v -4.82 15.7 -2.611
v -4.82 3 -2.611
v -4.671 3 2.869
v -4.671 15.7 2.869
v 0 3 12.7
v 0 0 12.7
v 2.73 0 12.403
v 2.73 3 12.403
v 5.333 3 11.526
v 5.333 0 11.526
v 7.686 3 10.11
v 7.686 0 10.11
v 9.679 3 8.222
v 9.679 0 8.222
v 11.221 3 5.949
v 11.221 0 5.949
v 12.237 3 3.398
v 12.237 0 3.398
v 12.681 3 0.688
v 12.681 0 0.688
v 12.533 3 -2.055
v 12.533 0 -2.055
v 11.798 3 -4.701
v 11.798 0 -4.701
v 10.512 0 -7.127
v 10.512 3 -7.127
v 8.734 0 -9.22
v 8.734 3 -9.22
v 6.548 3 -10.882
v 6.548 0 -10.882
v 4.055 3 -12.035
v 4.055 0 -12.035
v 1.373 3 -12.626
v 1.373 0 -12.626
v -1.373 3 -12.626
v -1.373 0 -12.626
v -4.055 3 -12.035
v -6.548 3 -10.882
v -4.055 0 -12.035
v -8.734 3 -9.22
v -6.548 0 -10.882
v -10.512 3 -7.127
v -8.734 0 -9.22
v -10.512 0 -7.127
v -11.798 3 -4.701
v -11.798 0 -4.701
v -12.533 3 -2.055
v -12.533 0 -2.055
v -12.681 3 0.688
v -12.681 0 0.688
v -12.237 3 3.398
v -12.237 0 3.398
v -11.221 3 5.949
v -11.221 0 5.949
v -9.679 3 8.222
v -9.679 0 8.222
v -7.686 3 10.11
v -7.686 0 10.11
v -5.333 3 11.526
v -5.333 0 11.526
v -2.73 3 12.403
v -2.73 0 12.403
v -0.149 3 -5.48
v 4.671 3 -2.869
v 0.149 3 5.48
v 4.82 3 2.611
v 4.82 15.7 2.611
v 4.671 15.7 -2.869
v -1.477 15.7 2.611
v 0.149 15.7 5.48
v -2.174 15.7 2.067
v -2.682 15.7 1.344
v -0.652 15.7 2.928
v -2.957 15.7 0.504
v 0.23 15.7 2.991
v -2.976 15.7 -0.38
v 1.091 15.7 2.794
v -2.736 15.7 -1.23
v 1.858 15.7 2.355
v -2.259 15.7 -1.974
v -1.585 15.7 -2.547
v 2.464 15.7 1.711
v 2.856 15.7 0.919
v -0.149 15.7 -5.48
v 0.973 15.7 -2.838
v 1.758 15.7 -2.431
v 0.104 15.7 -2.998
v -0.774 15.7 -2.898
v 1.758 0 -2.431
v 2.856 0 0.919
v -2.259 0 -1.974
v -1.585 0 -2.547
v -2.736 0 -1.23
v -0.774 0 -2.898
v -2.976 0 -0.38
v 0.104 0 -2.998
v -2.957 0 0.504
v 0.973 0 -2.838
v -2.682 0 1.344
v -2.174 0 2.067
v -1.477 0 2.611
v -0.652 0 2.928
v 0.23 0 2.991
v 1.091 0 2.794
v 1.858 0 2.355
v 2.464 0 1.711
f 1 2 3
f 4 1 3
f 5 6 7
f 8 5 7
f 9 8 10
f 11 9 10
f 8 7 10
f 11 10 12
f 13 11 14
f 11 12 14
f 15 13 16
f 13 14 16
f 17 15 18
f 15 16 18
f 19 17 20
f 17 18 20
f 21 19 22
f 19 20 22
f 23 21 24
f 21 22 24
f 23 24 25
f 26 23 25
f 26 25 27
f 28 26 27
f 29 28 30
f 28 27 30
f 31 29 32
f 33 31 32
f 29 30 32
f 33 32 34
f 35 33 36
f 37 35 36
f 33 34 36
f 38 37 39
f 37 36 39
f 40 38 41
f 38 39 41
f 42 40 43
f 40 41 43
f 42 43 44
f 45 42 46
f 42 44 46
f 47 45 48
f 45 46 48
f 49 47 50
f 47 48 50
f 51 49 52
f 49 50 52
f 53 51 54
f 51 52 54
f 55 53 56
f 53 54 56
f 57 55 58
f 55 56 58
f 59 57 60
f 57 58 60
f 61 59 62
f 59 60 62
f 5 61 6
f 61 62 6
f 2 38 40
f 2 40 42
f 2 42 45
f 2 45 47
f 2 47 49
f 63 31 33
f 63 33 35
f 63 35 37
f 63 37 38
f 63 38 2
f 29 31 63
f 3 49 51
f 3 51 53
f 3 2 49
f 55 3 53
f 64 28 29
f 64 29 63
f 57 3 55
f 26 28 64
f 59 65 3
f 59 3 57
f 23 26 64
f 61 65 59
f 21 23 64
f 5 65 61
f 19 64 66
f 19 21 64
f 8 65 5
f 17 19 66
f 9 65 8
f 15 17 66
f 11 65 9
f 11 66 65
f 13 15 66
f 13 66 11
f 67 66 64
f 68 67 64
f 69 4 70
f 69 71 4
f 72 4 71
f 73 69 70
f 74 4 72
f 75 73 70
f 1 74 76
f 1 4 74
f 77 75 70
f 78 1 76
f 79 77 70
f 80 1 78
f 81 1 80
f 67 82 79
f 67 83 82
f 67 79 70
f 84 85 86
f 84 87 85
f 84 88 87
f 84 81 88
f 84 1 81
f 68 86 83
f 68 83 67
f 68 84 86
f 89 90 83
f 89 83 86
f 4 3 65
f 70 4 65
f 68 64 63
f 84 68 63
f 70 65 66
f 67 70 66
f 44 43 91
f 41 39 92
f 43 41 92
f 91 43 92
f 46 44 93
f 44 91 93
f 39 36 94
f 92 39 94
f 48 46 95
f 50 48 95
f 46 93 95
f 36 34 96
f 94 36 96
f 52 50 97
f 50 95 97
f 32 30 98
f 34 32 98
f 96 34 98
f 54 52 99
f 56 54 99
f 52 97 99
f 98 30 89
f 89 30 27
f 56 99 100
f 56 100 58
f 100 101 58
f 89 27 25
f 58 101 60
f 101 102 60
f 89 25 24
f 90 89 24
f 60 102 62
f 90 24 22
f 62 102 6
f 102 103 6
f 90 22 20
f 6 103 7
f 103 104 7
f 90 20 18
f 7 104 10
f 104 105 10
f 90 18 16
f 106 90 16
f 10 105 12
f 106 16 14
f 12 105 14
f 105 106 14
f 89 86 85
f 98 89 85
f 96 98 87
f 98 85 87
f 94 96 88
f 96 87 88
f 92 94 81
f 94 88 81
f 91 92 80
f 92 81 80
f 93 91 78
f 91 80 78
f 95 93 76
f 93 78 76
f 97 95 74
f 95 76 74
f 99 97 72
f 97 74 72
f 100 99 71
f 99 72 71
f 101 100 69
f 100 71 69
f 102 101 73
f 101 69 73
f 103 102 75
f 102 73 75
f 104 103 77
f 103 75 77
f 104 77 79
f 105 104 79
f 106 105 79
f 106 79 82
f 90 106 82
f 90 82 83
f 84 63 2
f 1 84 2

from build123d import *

# Parameters (mm, degrees)
SKETCH1_R           = 12.7
BOSS_EXTRUDE1_DEPTH = 3
BOSS_EXTRUDE2_DEPTH = 12.7
CUT_EXTRUDE1_DEPTH  = 23


with BuildPart() as part:
    # Sketch1 → Boss-Extrude1 (new body)
    with BuildSketch(Plane(origin=(0, 0, 0), x_dir=(1, 0, 0), z_dir=(0, 1, 0))):
        with Locations(Location((0, 0, 0), (0, 0, 270))):
            Circle(SKETCH1_R)
    extrude(amount=BOSS_EXTRUDE1_DEPTH)

    # Sketch2 → Boss-Extrude2 (add)
    with BuildSketch(Plane(origin=(0, 3, 0), x_dir=(1, 0, 0), z_dir=(0, 1, 0))):
        Polygon((0.148889151, -5.48), (4.820263788, -2.611058213), (4.671374637, 2.868941787), (-0.148889151, 5.48), (-4.820263788, 2.611058213), (-4.671374637, -2.868941787), align=None)
    extrude(amount=BOSS_EXTRUDE2_DEPTH)

    # Sketch6 → Cut-Extrude1 (cut)
    with BuildSketch(Plane(origin=(0, 15.7, 0), x_dir=(1, 0, 0), z_dir=(0, 1, 0))):
        with BuildLine():
            Line((2.855757074, -0.919049257), (1.757975678, 2.430950743))
            ThreePointArc((1.757975678, 2.430950743), (-2.850834523, -0.934206895), (2.855757074, -0.919049257))
        make_face()
    extrude(amount=-CUT_EXTRUDE1_DEPTH, mode=Mode.SUBTRACT)


solid = part.part
